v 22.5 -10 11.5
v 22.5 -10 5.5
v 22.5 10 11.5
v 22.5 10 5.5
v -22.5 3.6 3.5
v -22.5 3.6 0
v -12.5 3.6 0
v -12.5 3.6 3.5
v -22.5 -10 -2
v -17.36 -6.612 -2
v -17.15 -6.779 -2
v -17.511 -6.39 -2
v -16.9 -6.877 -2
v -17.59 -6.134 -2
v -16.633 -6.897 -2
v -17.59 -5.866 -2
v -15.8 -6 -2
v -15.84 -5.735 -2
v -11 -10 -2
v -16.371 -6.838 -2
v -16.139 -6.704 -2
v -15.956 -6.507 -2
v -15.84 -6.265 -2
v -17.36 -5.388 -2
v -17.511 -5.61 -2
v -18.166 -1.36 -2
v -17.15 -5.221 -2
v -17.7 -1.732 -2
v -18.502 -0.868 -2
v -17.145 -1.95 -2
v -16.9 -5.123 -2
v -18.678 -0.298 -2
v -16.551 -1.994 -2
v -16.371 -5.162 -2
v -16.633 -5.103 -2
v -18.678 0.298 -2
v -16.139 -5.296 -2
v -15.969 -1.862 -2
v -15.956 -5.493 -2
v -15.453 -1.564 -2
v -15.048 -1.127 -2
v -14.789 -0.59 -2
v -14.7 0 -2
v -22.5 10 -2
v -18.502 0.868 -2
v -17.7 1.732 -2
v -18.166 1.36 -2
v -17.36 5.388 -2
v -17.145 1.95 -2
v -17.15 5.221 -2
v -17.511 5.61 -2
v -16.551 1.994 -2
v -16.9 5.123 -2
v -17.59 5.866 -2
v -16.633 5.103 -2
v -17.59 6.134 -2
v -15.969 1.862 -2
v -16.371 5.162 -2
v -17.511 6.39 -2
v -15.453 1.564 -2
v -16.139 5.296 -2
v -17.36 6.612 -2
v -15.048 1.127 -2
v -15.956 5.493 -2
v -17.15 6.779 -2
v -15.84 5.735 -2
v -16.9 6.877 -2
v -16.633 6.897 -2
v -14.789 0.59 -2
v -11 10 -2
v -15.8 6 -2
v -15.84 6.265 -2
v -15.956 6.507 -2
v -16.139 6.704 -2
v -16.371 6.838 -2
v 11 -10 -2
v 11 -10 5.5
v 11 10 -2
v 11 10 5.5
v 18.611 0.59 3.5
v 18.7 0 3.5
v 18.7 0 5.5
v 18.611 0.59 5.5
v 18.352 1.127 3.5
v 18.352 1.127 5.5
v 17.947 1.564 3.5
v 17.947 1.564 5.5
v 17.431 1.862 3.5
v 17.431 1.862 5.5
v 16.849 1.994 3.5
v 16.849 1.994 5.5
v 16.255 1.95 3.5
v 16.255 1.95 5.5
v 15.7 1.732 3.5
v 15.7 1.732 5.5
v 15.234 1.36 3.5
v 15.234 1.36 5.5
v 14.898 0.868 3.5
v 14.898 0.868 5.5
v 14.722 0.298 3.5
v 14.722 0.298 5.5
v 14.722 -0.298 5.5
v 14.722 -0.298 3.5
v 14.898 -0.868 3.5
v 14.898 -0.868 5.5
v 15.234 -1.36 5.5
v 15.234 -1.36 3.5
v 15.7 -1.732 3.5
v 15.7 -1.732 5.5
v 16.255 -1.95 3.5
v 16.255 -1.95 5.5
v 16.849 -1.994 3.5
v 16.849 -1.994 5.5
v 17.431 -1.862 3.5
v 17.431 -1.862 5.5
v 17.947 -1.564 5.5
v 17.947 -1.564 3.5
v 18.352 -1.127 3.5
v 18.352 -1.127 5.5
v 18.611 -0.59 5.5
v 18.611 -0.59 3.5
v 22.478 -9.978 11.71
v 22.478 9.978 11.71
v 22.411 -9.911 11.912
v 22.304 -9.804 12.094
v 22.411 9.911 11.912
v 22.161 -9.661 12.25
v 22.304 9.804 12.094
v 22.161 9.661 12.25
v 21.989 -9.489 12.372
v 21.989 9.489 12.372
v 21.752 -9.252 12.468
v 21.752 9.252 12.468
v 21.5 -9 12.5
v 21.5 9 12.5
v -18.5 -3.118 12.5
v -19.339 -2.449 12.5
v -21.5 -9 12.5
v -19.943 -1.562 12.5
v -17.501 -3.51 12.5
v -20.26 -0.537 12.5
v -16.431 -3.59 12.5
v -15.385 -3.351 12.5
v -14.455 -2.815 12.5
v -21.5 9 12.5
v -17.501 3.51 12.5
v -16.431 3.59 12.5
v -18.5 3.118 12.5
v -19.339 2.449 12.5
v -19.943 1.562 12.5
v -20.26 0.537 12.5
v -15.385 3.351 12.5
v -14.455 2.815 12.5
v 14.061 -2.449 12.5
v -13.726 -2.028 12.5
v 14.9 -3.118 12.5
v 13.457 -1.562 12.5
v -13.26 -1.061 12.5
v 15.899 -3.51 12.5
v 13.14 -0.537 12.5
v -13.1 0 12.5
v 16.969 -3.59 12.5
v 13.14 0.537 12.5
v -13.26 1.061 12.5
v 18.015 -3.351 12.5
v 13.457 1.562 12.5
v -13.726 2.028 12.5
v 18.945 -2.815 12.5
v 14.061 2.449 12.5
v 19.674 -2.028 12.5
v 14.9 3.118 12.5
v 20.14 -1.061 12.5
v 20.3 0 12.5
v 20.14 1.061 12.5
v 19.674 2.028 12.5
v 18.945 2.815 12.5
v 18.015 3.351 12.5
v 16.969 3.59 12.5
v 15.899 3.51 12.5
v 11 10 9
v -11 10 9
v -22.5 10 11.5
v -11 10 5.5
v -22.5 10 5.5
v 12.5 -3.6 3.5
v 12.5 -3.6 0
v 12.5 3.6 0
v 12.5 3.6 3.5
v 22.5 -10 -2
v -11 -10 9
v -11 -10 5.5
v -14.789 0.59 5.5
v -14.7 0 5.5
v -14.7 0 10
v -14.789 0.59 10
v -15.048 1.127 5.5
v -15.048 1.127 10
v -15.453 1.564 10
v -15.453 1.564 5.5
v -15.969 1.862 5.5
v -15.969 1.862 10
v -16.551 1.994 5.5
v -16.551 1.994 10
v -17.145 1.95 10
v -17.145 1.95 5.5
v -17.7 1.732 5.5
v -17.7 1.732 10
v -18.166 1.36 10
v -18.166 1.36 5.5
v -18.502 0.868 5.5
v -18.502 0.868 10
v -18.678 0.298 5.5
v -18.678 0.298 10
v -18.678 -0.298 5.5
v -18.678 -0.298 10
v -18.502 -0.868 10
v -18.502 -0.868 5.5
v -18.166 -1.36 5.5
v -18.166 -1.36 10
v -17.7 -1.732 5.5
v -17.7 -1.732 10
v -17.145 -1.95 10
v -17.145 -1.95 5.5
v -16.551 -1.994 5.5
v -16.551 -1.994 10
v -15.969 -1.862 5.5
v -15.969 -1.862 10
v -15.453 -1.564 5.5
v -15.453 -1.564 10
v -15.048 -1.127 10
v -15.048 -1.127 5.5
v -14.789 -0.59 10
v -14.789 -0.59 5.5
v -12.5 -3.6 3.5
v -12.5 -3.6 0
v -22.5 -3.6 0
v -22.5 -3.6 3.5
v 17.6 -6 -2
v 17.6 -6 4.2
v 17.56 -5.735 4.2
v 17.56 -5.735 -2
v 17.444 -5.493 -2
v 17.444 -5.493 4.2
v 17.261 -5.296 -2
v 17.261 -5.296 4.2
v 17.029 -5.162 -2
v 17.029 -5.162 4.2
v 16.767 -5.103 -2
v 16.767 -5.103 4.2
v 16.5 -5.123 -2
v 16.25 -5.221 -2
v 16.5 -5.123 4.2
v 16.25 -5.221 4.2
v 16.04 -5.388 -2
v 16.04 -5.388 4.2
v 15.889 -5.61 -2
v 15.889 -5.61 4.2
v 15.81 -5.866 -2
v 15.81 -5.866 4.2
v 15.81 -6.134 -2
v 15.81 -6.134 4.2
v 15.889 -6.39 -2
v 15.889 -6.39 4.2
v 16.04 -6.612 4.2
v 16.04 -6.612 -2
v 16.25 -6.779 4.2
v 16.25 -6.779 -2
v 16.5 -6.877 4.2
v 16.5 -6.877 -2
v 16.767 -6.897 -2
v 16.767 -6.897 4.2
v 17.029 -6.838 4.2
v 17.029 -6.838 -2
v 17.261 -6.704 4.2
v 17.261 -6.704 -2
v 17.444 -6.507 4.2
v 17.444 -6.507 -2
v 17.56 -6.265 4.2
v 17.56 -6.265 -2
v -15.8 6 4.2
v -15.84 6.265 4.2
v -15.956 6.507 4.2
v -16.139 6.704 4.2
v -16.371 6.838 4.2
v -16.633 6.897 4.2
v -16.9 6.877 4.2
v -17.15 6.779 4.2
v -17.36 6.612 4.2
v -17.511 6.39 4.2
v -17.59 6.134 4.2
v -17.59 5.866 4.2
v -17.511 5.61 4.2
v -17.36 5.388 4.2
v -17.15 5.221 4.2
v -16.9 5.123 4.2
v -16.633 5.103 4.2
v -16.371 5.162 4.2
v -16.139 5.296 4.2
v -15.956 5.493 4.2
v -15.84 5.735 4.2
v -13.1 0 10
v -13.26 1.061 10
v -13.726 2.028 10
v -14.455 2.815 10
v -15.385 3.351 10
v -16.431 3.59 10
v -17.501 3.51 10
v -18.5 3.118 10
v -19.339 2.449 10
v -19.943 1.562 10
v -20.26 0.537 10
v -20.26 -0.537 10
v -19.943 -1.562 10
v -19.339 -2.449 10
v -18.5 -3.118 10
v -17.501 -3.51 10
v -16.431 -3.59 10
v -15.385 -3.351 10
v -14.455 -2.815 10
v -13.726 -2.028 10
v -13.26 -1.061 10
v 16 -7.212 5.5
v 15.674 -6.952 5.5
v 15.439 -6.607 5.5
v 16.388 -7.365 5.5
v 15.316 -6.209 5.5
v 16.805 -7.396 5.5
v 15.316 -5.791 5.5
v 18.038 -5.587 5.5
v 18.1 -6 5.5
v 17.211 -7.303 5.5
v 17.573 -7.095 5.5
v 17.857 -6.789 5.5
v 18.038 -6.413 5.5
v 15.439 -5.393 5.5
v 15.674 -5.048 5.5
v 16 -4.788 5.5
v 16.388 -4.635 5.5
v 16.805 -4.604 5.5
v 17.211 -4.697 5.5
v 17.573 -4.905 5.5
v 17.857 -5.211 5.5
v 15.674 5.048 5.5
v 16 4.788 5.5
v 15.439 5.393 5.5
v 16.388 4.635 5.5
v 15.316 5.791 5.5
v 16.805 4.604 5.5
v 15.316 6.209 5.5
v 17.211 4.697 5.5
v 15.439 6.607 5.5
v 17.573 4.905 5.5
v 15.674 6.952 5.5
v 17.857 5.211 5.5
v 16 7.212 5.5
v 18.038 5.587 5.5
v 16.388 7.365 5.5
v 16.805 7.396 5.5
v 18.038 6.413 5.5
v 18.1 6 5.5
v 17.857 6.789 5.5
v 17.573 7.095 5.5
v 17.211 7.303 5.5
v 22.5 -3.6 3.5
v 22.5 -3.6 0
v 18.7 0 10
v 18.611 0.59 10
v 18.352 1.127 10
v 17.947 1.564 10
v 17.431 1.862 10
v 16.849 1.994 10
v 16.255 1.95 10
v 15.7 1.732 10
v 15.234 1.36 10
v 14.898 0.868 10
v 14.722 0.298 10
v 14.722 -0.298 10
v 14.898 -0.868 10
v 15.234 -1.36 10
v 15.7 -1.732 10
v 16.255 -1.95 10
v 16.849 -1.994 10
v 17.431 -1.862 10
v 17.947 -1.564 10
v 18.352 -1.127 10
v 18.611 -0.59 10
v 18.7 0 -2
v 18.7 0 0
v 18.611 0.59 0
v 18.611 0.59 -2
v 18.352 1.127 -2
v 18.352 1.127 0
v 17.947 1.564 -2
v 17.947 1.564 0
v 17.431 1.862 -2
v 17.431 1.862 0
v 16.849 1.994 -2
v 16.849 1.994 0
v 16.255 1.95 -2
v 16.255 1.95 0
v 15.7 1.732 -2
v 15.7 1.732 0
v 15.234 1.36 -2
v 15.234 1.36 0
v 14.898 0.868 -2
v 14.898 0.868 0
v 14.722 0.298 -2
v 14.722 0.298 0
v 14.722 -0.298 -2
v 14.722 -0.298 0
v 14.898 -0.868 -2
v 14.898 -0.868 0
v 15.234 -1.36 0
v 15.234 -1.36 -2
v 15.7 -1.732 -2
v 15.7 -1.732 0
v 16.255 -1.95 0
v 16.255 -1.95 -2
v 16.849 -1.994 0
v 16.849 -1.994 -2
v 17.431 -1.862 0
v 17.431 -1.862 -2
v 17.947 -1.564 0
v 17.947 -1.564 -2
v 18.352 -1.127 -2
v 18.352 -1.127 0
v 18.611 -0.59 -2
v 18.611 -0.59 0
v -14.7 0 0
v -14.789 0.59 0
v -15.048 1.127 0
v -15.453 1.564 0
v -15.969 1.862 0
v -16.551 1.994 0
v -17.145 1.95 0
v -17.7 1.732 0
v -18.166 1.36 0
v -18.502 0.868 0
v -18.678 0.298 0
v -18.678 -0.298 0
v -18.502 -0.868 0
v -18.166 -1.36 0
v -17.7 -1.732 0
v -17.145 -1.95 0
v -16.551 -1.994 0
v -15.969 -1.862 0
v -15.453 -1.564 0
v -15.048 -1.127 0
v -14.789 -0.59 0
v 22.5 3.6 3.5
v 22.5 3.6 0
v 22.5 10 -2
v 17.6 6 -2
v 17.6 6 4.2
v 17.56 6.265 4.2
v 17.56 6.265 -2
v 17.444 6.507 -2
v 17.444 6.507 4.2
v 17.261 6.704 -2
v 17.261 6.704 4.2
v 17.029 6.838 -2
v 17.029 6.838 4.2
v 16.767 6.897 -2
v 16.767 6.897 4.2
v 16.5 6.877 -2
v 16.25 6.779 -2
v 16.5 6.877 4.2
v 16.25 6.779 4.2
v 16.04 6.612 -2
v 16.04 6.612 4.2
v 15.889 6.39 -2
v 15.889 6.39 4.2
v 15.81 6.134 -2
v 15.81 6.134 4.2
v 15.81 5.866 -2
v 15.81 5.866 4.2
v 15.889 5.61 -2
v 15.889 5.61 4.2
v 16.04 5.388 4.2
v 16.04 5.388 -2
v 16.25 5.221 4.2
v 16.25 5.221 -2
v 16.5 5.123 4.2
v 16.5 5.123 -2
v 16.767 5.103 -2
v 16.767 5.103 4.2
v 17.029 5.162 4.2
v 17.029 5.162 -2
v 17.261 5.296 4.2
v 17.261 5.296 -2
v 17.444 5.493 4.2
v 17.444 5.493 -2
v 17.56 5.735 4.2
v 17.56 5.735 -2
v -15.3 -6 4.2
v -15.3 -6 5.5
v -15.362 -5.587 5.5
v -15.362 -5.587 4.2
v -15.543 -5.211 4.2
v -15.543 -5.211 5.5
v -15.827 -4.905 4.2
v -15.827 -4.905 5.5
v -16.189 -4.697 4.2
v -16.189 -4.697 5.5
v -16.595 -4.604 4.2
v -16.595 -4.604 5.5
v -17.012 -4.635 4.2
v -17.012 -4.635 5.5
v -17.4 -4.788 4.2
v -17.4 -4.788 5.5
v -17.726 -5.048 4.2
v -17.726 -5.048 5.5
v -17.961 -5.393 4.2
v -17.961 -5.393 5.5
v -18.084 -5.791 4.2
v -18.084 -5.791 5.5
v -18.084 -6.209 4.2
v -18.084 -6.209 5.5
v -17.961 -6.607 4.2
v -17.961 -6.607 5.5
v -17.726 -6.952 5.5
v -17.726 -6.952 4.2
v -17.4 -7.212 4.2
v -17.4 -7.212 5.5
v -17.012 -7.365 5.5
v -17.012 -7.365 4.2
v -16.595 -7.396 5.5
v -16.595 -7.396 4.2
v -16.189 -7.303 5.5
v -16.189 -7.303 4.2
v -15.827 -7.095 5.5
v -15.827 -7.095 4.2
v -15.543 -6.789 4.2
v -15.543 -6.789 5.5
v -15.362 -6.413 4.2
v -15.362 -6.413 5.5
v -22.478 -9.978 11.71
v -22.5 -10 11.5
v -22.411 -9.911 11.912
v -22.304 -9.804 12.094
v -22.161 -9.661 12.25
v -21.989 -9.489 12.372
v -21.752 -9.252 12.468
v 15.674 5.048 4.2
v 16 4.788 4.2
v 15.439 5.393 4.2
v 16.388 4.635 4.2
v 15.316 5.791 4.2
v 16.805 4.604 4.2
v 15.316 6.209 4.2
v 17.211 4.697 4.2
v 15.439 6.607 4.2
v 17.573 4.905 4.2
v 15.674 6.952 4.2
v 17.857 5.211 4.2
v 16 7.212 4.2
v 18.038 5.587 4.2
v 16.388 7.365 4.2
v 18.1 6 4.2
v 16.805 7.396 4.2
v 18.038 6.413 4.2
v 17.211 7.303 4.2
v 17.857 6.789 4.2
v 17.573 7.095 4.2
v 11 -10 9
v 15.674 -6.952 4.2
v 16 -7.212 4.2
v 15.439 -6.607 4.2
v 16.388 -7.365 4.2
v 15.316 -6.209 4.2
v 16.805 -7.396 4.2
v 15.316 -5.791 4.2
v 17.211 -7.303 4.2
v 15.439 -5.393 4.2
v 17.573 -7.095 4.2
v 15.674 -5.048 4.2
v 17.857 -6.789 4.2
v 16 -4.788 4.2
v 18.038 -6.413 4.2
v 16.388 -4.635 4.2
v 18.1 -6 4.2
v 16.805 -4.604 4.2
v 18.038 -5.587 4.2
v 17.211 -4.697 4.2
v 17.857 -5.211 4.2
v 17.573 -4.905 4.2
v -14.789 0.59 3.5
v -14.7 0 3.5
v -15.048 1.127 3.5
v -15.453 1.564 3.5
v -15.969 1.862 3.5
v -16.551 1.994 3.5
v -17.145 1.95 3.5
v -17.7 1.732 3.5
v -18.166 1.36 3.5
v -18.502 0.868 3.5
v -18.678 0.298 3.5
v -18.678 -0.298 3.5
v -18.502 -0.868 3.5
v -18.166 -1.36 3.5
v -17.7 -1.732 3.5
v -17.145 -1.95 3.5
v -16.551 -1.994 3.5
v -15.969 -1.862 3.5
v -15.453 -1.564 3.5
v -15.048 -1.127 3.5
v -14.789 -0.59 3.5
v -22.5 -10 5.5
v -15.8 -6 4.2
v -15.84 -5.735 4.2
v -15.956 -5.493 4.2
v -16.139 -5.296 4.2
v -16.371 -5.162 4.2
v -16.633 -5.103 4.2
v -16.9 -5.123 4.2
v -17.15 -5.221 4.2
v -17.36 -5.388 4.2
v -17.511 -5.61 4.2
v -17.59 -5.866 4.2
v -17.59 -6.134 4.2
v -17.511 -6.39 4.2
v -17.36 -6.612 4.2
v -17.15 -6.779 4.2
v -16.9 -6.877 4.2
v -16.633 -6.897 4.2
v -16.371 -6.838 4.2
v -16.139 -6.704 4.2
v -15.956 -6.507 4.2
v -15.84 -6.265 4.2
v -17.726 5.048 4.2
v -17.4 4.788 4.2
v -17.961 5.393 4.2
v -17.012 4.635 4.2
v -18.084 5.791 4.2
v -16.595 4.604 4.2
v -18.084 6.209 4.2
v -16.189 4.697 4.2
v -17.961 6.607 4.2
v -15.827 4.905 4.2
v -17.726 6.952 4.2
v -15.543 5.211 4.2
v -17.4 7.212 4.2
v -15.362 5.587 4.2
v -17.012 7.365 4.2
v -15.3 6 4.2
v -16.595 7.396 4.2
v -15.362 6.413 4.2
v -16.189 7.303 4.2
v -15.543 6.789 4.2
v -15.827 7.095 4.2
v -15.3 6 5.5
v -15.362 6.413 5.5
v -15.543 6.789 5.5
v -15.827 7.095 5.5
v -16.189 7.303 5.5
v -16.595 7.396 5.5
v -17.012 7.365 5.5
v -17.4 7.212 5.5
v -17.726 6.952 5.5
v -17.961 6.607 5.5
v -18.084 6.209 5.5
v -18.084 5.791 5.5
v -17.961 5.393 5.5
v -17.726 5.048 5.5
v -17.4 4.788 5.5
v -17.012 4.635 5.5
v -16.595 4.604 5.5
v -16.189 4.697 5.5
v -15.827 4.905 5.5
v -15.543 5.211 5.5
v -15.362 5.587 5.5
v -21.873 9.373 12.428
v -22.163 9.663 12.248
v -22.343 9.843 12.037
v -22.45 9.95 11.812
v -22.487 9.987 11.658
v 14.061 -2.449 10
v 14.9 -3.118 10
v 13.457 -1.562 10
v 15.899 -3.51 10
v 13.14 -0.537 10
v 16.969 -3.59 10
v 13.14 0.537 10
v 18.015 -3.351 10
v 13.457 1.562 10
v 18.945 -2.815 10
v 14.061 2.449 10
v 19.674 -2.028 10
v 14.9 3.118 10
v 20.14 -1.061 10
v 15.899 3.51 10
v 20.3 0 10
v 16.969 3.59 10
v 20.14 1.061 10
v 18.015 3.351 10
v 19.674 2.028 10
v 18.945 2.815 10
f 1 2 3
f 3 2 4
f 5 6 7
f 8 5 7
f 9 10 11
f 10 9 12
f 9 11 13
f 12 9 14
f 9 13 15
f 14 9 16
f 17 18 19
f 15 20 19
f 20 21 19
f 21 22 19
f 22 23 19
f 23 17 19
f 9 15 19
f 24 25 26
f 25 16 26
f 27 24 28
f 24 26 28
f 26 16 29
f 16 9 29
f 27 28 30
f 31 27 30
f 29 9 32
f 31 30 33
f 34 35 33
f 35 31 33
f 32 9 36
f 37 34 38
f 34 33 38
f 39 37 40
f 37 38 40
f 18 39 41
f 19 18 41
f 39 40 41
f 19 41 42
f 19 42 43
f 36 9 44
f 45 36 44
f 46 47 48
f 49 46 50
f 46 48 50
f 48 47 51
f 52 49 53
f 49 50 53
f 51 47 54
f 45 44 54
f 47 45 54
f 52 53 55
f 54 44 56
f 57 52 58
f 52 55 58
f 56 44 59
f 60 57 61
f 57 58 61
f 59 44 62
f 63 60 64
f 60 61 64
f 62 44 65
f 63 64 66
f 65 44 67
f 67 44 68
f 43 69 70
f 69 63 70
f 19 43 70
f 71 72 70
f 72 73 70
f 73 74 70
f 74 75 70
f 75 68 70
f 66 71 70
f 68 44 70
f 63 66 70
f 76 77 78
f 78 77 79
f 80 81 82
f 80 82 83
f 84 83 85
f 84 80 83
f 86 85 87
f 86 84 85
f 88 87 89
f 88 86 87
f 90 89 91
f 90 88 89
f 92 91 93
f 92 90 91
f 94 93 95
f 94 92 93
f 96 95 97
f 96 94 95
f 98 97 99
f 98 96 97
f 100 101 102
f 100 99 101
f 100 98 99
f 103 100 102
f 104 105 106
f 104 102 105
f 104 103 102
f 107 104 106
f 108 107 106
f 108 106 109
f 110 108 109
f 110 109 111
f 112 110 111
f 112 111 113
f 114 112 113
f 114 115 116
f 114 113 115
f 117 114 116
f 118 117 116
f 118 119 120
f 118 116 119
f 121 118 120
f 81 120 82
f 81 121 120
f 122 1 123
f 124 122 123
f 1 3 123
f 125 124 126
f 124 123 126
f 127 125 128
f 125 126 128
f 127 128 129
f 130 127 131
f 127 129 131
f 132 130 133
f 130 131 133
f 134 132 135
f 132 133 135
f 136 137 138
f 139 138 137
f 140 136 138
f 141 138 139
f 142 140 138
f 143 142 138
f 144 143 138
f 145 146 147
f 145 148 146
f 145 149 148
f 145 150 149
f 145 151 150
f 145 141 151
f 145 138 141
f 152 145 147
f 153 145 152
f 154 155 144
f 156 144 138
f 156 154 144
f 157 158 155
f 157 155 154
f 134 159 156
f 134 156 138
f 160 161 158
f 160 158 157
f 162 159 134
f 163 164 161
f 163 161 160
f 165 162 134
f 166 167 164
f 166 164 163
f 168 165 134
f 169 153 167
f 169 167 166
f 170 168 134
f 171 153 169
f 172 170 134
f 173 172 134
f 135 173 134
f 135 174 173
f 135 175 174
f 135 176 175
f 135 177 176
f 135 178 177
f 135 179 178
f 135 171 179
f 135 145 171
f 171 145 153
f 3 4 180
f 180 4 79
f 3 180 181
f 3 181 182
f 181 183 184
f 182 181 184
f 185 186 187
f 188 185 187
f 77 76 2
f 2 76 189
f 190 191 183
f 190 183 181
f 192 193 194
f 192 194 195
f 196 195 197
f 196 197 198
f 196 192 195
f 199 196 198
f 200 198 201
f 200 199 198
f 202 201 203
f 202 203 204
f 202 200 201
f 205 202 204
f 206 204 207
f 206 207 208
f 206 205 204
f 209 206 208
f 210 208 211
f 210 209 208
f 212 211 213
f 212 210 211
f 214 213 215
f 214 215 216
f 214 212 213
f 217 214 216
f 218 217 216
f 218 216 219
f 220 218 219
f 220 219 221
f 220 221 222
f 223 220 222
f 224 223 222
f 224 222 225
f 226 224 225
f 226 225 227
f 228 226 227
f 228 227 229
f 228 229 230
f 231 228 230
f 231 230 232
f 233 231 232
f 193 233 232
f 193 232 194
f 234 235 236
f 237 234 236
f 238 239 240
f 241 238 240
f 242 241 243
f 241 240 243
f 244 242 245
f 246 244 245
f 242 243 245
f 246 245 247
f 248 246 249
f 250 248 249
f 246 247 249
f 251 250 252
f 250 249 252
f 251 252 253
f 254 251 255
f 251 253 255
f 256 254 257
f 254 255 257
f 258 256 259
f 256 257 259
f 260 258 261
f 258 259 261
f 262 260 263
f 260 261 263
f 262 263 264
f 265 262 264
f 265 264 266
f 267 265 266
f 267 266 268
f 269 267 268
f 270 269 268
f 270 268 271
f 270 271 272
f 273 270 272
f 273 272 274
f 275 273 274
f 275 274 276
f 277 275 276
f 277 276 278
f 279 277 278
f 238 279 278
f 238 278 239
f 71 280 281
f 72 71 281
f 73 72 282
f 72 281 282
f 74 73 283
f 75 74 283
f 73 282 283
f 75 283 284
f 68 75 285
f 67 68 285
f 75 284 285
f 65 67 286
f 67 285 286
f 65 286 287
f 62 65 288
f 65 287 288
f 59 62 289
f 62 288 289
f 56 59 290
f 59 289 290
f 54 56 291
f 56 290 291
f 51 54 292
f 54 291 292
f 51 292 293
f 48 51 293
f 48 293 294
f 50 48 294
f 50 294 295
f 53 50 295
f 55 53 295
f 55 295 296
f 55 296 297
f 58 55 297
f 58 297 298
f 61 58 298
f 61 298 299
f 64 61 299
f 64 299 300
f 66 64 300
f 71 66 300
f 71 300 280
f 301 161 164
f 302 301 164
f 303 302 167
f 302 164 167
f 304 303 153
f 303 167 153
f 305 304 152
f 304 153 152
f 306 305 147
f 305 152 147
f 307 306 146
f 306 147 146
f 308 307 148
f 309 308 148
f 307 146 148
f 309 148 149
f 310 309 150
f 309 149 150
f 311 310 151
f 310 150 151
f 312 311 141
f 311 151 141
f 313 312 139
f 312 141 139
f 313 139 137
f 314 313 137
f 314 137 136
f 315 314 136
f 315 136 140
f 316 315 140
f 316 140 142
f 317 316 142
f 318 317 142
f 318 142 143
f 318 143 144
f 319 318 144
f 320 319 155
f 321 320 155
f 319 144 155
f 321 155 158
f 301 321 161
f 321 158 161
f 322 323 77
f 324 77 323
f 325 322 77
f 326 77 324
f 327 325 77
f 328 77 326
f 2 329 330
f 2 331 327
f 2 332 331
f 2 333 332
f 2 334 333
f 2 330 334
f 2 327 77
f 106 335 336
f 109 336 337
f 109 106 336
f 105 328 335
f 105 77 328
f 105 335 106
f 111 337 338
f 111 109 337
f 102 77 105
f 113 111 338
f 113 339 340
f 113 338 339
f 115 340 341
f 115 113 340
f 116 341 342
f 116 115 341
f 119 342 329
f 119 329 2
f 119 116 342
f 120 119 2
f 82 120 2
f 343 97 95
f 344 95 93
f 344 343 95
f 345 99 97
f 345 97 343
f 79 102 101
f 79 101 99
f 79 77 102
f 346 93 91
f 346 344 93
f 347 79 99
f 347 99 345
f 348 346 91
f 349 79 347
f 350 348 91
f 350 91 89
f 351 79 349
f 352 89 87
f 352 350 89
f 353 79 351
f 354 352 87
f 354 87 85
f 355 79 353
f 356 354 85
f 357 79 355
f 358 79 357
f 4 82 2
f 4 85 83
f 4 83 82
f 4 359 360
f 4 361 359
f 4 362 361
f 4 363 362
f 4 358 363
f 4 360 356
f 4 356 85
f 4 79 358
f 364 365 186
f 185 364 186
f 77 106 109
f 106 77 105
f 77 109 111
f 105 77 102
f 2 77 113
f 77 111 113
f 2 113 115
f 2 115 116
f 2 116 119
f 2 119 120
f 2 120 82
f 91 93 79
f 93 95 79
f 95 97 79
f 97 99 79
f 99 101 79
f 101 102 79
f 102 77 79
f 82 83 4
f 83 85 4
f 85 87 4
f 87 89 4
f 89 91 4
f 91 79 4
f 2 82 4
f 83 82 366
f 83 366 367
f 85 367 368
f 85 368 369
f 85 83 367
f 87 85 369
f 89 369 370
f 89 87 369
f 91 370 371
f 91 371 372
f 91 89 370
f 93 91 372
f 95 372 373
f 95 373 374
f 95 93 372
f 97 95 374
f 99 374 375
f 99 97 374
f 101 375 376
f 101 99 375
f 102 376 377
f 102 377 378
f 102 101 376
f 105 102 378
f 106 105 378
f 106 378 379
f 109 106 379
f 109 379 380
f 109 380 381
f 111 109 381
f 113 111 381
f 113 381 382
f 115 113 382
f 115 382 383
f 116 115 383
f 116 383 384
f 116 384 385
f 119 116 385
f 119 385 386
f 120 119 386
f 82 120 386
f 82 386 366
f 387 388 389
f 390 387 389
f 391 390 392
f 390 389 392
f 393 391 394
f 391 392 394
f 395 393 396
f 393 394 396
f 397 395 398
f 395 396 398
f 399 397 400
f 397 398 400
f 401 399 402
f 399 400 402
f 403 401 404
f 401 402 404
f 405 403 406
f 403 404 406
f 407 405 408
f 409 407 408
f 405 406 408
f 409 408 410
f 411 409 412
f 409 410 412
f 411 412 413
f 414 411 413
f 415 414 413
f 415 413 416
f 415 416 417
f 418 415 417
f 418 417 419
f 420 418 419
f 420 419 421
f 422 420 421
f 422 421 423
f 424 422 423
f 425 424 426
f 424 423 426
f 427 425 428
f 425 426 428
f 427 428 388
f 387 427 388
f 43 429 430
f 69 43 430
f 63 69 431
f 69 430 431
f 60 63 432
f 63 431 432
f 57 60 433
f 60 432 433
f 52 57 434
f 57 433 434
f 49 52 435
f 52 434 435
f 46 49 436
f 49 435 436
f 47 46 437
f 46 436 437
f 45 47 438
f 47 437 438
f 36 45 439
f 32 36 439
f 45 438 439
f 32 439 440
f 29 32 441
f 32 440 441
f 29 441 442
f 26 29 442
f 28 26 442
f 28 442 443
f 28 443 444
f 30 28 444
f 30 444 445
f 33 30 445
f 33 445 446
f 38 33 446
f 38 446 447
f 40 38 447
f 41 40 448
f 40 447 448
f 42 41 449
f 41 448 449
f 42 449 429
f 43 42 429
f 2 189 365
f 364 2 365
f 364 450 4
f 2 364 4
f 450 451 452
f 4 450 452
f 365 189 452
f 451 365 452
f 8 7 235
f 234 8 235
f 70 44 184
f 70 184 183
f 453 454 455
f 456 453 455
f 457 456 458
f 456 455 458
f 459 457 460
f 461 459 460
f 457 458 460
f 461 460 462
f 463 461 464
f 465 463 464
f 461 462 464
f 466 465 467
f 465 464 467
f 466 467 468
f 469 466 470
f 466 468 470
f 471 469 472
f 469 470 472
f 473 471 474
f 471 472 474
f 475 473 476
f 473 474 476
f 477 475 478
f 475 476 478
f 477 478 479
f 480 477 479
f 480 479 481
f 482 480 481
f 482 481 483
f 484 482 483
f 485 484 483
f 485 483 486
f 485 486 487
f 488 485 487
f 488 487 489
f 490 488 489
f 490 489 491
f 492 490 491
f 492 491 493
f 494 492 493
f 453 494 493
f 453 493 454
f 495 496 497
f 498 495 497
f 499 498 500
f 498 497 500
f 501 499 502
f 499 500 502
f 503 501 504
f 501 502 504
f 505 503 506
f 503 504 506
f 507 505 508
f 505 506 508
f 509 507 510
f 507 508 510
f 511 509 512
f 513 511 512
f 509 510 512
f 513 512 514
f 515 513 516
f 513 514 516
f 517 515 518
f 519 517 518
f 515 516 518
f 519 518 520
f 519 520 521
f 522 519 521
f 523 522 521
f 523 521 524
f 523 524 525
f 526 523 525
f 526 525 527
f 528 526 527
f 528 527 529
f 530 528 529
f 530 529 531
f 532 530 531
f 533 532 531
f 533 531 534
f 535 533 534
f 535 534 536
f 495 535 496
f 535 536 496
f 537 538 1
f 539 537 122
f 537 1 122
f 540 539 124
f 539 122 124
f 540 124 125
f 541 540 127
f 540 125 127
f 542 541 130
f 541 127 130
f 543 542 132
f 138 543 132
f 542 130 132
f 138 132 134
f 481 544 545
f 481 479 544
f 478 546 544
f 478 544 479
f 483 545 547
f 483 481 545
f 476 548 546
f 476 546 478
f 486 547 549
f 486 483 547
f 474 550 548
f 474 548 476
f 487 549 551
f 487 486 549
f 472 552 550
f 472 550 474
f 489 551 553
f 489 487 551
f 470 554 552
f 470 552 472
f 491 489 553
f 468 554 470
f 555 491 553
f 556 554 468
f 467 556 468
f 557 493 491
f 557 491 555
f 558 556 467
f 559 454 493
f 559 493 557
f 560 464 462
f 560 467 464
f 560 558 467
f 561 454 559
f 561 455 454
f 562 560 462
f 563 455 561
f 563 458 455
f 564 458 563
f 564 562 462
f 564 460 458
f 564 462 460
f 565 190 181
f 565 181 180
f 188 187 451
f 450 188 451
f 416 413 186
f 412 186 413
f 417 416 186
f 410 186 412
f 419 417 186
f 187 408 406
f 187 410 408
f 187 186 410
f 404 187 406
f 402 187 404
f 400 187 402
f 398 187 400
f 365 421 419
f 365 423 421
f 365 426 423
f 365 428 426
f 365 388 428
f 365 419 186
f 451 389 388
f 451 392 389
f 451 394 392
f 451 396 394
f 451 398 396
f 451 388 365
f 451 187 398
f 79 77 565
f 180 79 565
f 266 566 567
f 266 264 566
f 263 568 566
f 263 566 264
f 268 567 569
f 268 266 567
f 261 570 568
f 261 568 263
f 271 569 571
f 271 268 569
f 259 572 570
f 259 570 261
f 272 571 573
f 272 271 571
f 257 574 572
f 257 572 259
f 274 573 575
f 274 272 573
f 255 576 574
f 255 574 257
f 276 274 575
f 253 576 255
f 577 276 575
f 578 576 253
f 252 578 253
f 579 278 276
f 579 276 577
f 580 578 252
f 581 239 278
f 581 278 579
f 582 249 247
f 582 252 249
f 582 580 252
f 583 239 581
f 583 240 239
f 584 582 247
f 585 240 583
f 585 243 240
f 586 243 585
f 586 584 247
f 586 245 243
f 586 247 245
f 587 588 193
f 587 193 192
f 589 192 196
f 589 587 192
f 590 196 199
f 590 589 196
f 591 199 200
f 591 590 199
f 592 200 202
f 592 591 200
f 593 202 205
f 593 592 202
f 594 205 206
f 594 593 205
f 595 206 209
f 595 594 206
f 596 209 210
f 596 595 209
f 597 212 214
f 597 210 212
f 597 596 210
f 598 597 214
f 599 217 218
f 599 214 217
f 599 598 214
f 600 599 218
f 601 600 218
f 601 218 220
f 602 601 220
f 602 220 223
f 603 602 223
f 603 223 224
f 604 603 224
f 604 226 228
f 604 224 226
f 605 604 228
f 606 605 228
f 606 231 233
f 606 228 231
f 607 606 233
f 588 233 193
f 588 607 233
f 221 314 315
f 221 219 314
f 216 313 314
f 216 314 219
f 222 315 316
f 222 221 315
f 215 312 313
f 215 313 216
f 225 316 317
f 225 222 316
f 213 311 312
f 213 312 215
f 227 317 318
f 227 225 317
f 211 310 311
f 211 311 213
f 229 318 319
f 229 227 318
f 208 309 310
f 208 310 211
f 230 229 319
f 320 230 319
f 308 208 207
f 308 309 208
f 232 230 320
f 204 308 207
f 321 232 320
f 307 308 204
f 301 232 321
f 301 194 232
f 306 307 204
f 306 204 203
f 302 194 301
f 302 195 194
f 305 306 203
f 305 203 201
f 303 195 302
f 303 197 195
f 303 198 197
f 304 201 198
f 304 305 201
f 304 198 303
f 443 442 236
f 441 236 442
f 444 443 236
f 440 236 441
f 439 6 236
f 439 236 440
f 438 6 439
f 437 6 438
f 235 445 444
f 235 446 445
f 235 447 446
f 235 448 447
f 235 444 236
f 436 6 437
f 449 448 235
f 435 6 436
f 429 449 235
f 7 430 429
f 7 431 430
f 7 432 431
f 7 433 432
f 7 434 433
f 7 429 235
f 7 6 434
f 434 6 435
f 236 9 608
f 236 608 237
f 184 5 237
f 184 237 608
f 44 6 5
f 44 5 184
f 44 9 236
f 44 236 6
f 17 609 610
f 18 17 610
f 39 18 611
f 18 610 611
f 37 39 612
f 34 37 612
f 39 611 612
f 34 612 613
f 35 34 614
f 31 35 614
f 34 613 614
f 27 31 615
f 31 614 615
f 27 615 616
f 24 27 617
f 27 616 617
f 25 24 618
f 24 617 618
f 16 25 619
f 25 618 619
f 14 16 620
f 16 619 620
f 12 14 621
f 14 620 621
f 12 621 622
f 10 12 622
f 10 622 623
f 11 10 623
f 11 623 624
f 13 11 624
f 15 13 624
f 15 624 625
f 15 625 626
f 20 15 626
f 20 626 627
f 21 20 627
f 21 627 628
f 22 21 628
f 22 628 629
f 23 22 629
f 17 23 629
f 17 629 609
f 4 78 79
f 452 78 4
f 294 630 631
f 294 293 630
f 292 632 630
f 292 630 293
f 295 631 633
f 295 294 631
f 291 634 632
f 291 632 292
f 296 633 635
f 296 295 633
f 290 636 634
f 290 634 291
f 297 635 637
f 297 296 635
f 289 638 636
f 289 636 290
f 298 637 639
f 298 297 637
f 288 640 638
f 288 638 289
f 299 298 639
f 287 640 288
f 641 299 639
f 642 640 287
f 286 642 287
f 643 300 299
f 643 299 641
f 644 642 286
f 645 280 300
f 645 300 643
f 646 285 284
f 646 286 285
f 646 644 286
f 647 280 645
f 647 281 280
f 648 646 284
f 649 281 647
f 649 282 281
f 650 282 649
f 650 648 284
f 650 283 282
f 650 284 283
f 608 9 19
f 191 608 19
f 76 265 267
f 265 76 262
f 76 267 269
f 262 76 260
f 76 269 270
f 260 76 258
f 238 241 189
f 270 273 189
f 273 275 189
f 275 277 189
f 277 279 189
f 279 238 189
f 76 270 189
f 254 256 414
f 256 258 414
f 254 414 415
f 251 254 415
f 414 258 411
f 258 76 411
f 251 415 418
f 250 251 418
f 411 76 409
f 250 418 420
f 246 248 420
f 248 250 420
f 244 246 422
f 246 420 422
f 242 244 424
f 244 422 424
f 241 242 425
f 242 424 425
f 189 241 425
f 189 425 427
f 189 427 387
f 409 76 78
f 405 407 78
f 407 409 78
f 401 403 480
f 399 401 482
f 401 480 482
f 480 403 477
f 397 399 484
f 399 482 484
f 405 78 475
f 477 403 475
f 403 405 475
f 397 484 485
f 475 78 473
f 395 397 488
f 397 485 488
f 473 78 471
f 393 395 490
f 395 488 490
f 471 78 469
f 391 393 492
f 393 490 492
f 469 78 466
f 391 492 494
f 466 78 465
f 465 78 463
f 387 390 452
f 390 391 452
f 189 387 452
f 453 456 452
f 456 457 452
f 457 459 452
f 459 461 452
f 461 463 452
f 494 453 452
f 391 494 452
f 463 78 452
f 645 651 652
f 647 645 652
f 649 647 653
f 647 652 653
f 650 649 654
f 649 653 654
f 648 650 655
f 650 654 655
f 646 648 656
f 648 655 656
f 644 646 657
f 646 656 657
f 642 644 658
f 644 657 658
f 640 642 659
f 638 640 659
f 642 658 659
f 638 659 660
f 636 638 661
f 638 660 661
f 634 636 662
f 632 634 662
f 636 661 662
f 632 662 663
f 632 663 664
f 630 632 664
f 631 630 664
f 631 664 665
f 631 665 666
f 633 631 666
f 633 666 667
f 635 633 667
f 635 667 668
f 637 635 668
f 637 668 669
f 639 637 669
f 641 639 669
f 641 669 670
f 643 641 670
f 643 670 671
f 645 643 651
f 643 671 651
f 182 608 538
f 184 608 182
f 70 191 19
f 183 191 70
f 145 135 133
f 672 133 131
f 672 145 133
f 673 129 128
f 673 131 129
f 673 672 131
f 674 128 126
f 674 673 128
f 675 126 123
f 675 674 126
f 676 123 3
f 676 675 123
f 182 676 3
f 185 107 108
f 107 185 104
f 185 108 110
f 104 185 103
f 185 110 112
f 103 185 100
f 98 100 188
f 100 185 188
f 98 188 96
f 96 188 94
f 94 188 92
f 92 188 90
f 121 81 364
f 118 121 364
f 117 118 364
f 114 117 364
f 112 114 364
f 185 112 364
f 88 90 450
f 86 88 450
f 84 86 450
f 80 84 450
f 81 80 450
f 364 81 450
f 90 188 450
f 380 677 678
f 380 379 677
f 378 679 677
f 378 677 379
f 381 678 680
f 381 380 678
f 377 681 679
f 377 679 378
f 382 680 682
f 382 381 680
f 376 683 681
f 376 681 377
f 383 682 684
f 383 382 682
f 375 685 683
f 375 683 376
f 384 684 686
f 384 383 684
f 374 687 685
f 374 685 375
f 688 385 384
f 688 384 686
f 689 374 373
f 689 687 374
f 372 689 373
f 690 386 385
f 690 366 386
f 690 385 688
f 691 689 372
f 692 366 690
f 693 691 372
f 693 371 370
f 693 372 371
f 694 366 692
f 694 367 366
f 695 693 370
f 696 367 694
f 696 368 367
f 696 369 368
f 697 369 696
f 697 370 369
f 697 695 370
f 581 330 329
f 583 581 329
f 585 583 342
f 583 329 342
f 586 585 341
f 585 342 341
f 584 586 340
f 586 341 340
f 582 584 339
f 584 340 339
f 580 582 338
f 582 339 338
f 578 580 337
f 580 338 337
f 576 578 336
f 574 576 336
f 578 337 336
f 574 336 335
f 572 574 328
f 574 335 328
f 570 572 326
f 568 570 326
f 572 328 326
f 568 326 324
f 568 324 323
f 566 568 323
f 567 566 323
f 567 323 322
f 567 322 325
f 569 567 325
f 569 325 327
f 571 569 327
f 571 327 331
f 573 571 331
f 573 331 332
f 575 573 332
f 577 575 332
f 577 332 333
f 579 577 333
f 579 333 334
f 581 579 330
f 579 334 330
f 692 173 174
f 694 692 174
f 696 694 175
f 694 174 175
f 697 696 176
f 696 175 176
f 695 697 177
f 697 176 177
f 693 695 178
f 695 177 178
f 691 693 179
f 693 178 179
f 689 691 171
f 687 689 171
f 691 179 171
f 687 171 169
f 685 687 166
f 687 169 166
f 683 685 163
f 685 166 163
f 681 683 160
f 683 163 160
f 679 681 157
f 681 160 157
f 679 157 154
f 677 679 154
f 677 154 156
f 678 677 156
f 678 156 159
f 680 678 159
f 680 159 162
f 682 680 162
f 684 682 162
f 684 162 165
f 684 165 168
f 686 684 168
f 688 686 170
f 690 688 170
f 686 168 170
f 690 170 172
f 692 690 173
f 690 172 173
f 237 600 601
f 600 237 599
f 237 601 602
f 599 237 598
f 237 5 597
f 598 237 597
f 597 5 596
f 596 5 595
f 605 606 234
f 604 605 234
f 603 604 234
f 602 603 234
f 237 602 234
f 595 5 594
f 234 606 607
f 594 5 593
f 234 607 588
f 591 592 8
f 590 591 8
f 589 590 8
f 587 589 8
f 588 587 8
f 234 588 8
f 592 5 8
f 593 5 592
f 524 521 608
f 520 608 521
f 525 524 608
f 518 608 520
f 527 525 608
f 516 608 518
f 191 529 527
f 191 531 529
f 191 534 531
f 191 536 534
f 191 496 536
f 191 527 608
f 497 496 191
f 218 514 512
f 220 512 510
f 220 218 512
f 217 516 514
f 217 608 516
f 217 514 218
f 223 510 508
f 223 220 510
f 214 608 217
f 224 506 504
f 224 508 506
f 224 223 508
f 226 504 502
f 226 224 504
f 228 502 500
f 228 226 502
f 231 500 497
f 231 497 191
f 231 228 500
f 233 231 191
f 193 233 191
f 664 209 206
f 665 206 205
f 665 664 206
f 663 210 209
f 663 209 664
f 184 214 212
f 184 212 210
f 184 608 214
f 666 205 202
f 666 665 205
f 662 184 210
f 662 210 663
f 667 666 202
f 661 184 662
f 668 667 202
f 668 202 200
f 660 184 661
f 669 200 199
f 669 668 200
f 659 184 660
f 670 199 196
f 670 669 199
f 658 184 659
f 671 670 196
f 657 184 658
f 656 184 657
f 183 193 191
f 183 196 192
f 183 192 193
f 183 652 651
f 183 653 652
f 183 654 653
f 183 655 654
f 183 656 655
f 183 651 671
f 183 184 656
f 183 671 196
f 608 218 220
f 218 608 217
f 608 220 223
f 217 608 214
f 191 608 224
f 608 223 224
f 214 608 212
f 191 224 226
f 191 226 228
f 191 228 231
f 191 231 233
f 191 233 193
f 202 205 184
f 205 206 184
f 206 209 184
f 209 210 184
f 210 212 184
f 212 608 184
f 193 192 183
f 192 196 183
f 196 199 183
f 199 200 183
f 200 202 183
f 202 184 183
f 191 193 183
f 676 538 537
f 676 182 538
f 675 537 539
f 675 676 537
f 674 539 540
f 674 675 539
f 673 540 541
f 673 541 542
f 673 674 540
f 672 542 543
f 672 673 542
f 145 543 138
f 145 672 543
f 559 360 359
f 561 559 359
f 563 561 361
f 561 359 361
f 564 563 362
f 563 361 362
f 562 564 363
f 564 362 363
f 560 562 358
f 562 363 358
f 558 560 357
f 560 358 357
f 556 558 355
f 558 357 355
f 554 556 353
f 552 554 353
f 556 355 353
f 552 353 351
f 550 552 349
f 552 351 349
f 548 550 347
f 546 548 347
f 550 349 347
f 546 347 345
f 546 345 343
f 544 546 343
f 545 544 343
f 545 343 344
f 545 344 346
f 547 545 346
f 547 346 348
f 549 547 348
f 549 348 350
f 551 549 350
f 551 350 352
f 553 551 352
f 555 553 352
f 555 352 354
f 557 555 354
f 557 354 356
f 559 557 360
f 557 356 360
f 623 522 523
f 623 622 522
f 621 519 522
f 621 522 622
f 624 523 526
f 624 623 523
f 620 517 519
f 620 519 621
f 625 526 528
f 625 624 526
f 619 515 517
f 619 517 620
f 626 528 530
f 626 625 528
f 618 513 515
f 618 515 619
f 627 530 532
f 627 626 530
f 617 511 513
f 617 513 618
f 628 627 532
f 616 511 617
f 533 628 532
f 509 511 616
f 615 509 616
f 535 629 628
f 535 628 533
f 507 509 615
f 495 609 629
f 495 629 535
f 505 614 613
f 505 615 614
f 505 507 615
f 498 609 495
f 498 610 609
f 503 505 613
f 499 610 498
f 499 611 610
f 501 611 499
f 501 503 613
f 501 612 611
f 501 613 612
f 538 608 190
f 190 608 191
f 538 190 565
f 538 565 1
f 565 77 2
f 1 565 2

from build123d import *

# Parameters (mm, degrees)
F0_W      = 10
F0_H      = 7.2
F0_R      = 2
F1_DEPTH  = 2
F2_DEPTH  = 3.5
F3_W      = 45
F3_H      = 20
F4_DEPTH  = 2
F5_DEPTH  = 25
F6_W      = 22
F6_H      = 20
F6_R      = 0.9
F7_DEPTH  = 25
F6_R_2    = 1.4
F8_DEPTH  = 1.3
F6_W_2    = 11.5
F6_R_3    = 2
F9_DEPTH  = 7
F10_R     = 3.6
F10_R_2   = 2
F11_DEPTH = 2.5
F12_R     = 1
F13_W     = 22
F13_H     = 3.5
F14_DEPTH = 25


with BuildPart() as f1:
    # F0 (on Top) → F1 (new body)
    with BuildSketch(Plane.XY):
        Polygon((22.5, 3.6), (22.5, 10), (-22.5, 10), (-22.5, 3.6), (-12.5, 3.6), (-12.5, -3.6), (-22.5, -3.6), (-22.5, -10), (22.5, -10), (22.5, -3.6), (12.5, -3.6), (12.5, 3.6), align=None)
        with Locations((-17.5, 0)):
            Rectangle(F0_W, F0_H)
        with Locations((-16.7, 0)):
            Circle(F0_R, mode=Mode.SUBTRACT)
        with Locations((17.5, 0)):
            Rectangle(F0_W, F0_H)
        with Locations((16.7, 0)):
            Circle(F0_R, mode=Mode.SUBTRACT)
    extrude(amount=-F1_DEPTH)

    # F0 (on Top) → F2 (join)
    with BuildSketch(Plane.XY):
        Polygon((22.5, 3.6), (22.5, 10), (-22.5, 10), (-22.5, 3.6), (-12.5, 3.6), (-12.5, -3.6), (-22.5, -3.6), (-22.5, -10), (22.5, -10), (22.5, -3.6), (12.5, -3.6), (12.5, 3.6), align=None)
    extrude(amount=F2_DEPTH)

    # F3 (on face) → F4 (join)
    with BuildSketch(Plane.XY.offset(3.5)):
        Rectangle(F3_W, F3_H)
    extrude(amount=F4_DEPTH)

    # F0 (on Top) → F5 (cut)
    with BuildSketch(Plane.XY):
        with Locations((16.7, 0)):
            Circle(F0_R)
        with Locations((-16.7, 0)):
            Circle(F0_R)
    extrude(amount=F5_DEPTH, mode=Mode.SUBTRACT)

    # F6 (on face) → F7 (cut)
    with BuildSketch(Plane.XY.offset(5.5)):
        Rectangle(F6_W, F6_H)
        with Locations((-16.7, 6)):
            Circle(F6_R)
        with Locations((16.7, 6)):
            Circle(F6_R)
        with Locations((16.7, -6)):
            Circle(F6_R)
        with Locations((-16.7, -6)):
            Circle(F6_R)
    extrude(amount=-F7_DEPTH, mode=Mode.SUBTRACT)

    # F6 (on face) → F8 (cut)
    with BuildSketch(Plane.XY.offset(5.5)):
        with Locations((-16.7, 6)):
            Circle(F6_R_2)
        with Locations((-16.7, 6)):
            Circle(F6_R, mode=Mode.SUBTRACT)
        with Locations((-16.7, -6)):
            Circle(F6_R_2)
        with Locations((-16.7, -6)):
            Circle(F6_R, mode=Mode.SUBTRACT)
        with Locations((16.7, -6)):
            Circle(F6_R_2)
        with Locations((16.7, -6)):
            Circle(F6_R, mode=Mode.SUBTRACT)
        with Locations((16.7, 6)):
            Circle(F6_R_2)
        with Locations((16.7, 6)):
            Circle(F6_R, mode=Mode.SUBTRACT)
    extrude(amount=-F8_DEPTH, mode=Mode.SUBTRACT)


with BuildPart() as f9:
    # F6 (on face) → F9 (new body)
    with BuildSketch(Plane.XY.offset(5.5)):
        Rectangle(F6_W, F6_H)
        with Locations((-16.75, 0)):
            Rectangle(F6_W_2, F6_H)
        with Locations((-16.7, -6)):
            Circle(F6_R_2, mode=Mode.SUBTRACT)
        with Locations((-16.7, 0)):
            Circle(F6_R_3, mode=Mode.SUBTRACT)
        with Locations((-16.7, 6)):
            Circle(F6_R_2, mode=Mode.SUBTRACT)
        with Locations((16.75, 0)):
            Rectangle(F6_W_2, F6_H)
        with Locations((16.7, -6)):
            Circle(F6_R_2, mode=Mode.SUBTRACT)
        with Locations((16.7, 0)):
            Circle(F6_R_3, mode=Mode.SUBTRACT)
        with Locations((16.7, 6)):
            Circle(F6_R_2, mode=Mode.SUBTRACT)
        with Locations((16.7, 6)):
            Circle(F6_R_2)
        with Locations((16.7, 6)):
            Circle(F6_R, mode=Mode.SUBTRACT)
        with Locations((16.7, -6)):
            Circle(F6_R_2)
        with Locations((16.7, -6)):
            Circle(F6_R, mode=Mode.SUBTRACT)
        with Locations((-16.7, -6)):
            Circle(F6_R_2)
        with Locations((-16.7, -6)):
            Circle(F6_R, mode=Mode.SUBTRACT)
        with Locations((-16.7, 6)):
            Circle(F6_R_2)
        with Locations((-16.7, 6)):
            Circle(F6_R, mode=Mode.SUBTRACT)
        with Locations((16.7, 6)):
            Circle(F6_R)
        with Locations((16.7, -6)):
            Circle(F6_R)
        with Locations((-16.7, -6)):
            Circle(F6_R)
        with Locations((-16.7, 6)):
            Circle(F6_R)
    extrude(amount=F9_DEPTH)

    # F10 (on face) → F11 (cut)
    with BuildSketch(Plane.XY.offset(12.5)):
        with Locations((-16.7, 0)):
            Circle(F10_R)
        with Locations((-16.7, 0)):
            Circle(F10_R_2, mode=Mode.SUBTRACT)
        with Locations((16.7, 0)):
            Circle(F10_R)
        with Locations((16.7, 0)):
            Circle(F10_R_2, mode=Mode.SUBTRACT)
    extrude(amount=-F11_DEPTH, mode=Mode.SUBTRACT)

    # F12
    f12_edges = [f9.edges().sort_by_distance(p)[0] for p in [
        (0, -10, 12.5),
        (22.5, 0, 12.5),
        (0, 10, 12.5),
        (-22.5, 0, 12.5),
    ]]
    fillet(f12_edges, radius=F12_R)

    # F13 (on face) → F14 (cut)
    with BuildSketch(Plane.XZ.offset(10)):
        with Locations((0, 7.25)):
            Rectangle(F13_W, F13_H)
    extrude(amount=-F14_DEPTH, mode=Mode.SUBTRACT)


solid = Compound([f1.part, f9.part])
